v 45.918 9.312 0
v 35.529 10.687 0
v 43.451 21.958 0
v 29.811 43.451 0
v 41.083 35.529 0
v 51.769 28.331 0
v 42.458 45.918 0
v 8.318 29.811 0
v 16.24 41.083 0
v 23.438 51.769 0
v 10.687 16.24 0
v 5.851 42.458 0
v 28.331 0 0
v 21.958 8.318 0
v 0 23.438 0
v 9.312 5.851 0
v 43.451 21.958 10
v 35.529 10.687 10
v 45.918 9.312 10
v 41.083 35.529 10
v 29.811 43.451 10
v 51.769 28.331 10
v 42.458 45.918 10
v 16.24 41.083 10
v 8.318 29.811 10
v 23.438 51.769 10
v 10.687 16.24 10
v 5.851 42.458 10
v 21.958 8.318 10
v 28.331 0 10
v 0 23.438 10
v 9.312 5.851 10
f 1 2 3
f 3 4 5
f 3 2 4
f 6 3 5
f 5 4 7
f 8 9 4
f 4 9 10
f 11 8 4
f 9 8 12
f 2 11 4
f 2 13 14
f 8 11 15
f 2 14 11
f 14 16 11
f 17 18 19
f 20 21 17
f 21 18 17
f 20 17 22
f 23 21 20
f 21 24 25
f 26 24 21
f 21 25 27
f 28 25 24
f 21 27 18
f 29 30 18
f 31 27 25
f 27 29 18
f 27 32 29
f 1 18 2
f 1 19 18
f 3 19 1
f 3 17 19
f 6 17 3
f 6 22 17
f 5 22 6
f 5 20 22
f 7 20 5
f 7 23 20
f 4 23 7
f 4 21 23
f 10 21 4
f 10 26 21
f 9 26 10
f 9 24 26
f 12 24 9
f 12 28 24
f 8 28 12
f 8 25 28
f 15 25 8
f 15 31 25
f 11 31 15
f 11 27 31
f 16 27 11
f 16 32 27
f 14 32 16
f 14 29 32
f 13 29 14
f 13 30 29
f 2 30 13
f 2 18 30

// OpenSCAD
$fn = 32;

// ----------------------------------------------------------------------
// Chain sprocket: 8 teeth, 18 mm root radius
// ----------------------------------------------------------------------

// --- parameters (mm) ---
profile_height = 10;      // extrusion height
profile_points = 16;      // points of the closed outline

profile = [[43.451, 21.958], [51.769, 28.331], [41.083, 35.529], [42.458, 45.918], [29.811, 43.451], [23.438, 51.769], [16.24, 41.083], [5.851, 42.458], [8.318, 29.811], [0, 23.438], [10.687, 16.24], [9.312, 5.851], [21.958, 8.318], [28.331, 0], [35.529, 10.687], [45.918, 9.312]];  // single closed polygon, 16 points, counter clockwise

// --- the one profile operation ---
linear_extrude(height = profile_height) polygon(points = profile);
